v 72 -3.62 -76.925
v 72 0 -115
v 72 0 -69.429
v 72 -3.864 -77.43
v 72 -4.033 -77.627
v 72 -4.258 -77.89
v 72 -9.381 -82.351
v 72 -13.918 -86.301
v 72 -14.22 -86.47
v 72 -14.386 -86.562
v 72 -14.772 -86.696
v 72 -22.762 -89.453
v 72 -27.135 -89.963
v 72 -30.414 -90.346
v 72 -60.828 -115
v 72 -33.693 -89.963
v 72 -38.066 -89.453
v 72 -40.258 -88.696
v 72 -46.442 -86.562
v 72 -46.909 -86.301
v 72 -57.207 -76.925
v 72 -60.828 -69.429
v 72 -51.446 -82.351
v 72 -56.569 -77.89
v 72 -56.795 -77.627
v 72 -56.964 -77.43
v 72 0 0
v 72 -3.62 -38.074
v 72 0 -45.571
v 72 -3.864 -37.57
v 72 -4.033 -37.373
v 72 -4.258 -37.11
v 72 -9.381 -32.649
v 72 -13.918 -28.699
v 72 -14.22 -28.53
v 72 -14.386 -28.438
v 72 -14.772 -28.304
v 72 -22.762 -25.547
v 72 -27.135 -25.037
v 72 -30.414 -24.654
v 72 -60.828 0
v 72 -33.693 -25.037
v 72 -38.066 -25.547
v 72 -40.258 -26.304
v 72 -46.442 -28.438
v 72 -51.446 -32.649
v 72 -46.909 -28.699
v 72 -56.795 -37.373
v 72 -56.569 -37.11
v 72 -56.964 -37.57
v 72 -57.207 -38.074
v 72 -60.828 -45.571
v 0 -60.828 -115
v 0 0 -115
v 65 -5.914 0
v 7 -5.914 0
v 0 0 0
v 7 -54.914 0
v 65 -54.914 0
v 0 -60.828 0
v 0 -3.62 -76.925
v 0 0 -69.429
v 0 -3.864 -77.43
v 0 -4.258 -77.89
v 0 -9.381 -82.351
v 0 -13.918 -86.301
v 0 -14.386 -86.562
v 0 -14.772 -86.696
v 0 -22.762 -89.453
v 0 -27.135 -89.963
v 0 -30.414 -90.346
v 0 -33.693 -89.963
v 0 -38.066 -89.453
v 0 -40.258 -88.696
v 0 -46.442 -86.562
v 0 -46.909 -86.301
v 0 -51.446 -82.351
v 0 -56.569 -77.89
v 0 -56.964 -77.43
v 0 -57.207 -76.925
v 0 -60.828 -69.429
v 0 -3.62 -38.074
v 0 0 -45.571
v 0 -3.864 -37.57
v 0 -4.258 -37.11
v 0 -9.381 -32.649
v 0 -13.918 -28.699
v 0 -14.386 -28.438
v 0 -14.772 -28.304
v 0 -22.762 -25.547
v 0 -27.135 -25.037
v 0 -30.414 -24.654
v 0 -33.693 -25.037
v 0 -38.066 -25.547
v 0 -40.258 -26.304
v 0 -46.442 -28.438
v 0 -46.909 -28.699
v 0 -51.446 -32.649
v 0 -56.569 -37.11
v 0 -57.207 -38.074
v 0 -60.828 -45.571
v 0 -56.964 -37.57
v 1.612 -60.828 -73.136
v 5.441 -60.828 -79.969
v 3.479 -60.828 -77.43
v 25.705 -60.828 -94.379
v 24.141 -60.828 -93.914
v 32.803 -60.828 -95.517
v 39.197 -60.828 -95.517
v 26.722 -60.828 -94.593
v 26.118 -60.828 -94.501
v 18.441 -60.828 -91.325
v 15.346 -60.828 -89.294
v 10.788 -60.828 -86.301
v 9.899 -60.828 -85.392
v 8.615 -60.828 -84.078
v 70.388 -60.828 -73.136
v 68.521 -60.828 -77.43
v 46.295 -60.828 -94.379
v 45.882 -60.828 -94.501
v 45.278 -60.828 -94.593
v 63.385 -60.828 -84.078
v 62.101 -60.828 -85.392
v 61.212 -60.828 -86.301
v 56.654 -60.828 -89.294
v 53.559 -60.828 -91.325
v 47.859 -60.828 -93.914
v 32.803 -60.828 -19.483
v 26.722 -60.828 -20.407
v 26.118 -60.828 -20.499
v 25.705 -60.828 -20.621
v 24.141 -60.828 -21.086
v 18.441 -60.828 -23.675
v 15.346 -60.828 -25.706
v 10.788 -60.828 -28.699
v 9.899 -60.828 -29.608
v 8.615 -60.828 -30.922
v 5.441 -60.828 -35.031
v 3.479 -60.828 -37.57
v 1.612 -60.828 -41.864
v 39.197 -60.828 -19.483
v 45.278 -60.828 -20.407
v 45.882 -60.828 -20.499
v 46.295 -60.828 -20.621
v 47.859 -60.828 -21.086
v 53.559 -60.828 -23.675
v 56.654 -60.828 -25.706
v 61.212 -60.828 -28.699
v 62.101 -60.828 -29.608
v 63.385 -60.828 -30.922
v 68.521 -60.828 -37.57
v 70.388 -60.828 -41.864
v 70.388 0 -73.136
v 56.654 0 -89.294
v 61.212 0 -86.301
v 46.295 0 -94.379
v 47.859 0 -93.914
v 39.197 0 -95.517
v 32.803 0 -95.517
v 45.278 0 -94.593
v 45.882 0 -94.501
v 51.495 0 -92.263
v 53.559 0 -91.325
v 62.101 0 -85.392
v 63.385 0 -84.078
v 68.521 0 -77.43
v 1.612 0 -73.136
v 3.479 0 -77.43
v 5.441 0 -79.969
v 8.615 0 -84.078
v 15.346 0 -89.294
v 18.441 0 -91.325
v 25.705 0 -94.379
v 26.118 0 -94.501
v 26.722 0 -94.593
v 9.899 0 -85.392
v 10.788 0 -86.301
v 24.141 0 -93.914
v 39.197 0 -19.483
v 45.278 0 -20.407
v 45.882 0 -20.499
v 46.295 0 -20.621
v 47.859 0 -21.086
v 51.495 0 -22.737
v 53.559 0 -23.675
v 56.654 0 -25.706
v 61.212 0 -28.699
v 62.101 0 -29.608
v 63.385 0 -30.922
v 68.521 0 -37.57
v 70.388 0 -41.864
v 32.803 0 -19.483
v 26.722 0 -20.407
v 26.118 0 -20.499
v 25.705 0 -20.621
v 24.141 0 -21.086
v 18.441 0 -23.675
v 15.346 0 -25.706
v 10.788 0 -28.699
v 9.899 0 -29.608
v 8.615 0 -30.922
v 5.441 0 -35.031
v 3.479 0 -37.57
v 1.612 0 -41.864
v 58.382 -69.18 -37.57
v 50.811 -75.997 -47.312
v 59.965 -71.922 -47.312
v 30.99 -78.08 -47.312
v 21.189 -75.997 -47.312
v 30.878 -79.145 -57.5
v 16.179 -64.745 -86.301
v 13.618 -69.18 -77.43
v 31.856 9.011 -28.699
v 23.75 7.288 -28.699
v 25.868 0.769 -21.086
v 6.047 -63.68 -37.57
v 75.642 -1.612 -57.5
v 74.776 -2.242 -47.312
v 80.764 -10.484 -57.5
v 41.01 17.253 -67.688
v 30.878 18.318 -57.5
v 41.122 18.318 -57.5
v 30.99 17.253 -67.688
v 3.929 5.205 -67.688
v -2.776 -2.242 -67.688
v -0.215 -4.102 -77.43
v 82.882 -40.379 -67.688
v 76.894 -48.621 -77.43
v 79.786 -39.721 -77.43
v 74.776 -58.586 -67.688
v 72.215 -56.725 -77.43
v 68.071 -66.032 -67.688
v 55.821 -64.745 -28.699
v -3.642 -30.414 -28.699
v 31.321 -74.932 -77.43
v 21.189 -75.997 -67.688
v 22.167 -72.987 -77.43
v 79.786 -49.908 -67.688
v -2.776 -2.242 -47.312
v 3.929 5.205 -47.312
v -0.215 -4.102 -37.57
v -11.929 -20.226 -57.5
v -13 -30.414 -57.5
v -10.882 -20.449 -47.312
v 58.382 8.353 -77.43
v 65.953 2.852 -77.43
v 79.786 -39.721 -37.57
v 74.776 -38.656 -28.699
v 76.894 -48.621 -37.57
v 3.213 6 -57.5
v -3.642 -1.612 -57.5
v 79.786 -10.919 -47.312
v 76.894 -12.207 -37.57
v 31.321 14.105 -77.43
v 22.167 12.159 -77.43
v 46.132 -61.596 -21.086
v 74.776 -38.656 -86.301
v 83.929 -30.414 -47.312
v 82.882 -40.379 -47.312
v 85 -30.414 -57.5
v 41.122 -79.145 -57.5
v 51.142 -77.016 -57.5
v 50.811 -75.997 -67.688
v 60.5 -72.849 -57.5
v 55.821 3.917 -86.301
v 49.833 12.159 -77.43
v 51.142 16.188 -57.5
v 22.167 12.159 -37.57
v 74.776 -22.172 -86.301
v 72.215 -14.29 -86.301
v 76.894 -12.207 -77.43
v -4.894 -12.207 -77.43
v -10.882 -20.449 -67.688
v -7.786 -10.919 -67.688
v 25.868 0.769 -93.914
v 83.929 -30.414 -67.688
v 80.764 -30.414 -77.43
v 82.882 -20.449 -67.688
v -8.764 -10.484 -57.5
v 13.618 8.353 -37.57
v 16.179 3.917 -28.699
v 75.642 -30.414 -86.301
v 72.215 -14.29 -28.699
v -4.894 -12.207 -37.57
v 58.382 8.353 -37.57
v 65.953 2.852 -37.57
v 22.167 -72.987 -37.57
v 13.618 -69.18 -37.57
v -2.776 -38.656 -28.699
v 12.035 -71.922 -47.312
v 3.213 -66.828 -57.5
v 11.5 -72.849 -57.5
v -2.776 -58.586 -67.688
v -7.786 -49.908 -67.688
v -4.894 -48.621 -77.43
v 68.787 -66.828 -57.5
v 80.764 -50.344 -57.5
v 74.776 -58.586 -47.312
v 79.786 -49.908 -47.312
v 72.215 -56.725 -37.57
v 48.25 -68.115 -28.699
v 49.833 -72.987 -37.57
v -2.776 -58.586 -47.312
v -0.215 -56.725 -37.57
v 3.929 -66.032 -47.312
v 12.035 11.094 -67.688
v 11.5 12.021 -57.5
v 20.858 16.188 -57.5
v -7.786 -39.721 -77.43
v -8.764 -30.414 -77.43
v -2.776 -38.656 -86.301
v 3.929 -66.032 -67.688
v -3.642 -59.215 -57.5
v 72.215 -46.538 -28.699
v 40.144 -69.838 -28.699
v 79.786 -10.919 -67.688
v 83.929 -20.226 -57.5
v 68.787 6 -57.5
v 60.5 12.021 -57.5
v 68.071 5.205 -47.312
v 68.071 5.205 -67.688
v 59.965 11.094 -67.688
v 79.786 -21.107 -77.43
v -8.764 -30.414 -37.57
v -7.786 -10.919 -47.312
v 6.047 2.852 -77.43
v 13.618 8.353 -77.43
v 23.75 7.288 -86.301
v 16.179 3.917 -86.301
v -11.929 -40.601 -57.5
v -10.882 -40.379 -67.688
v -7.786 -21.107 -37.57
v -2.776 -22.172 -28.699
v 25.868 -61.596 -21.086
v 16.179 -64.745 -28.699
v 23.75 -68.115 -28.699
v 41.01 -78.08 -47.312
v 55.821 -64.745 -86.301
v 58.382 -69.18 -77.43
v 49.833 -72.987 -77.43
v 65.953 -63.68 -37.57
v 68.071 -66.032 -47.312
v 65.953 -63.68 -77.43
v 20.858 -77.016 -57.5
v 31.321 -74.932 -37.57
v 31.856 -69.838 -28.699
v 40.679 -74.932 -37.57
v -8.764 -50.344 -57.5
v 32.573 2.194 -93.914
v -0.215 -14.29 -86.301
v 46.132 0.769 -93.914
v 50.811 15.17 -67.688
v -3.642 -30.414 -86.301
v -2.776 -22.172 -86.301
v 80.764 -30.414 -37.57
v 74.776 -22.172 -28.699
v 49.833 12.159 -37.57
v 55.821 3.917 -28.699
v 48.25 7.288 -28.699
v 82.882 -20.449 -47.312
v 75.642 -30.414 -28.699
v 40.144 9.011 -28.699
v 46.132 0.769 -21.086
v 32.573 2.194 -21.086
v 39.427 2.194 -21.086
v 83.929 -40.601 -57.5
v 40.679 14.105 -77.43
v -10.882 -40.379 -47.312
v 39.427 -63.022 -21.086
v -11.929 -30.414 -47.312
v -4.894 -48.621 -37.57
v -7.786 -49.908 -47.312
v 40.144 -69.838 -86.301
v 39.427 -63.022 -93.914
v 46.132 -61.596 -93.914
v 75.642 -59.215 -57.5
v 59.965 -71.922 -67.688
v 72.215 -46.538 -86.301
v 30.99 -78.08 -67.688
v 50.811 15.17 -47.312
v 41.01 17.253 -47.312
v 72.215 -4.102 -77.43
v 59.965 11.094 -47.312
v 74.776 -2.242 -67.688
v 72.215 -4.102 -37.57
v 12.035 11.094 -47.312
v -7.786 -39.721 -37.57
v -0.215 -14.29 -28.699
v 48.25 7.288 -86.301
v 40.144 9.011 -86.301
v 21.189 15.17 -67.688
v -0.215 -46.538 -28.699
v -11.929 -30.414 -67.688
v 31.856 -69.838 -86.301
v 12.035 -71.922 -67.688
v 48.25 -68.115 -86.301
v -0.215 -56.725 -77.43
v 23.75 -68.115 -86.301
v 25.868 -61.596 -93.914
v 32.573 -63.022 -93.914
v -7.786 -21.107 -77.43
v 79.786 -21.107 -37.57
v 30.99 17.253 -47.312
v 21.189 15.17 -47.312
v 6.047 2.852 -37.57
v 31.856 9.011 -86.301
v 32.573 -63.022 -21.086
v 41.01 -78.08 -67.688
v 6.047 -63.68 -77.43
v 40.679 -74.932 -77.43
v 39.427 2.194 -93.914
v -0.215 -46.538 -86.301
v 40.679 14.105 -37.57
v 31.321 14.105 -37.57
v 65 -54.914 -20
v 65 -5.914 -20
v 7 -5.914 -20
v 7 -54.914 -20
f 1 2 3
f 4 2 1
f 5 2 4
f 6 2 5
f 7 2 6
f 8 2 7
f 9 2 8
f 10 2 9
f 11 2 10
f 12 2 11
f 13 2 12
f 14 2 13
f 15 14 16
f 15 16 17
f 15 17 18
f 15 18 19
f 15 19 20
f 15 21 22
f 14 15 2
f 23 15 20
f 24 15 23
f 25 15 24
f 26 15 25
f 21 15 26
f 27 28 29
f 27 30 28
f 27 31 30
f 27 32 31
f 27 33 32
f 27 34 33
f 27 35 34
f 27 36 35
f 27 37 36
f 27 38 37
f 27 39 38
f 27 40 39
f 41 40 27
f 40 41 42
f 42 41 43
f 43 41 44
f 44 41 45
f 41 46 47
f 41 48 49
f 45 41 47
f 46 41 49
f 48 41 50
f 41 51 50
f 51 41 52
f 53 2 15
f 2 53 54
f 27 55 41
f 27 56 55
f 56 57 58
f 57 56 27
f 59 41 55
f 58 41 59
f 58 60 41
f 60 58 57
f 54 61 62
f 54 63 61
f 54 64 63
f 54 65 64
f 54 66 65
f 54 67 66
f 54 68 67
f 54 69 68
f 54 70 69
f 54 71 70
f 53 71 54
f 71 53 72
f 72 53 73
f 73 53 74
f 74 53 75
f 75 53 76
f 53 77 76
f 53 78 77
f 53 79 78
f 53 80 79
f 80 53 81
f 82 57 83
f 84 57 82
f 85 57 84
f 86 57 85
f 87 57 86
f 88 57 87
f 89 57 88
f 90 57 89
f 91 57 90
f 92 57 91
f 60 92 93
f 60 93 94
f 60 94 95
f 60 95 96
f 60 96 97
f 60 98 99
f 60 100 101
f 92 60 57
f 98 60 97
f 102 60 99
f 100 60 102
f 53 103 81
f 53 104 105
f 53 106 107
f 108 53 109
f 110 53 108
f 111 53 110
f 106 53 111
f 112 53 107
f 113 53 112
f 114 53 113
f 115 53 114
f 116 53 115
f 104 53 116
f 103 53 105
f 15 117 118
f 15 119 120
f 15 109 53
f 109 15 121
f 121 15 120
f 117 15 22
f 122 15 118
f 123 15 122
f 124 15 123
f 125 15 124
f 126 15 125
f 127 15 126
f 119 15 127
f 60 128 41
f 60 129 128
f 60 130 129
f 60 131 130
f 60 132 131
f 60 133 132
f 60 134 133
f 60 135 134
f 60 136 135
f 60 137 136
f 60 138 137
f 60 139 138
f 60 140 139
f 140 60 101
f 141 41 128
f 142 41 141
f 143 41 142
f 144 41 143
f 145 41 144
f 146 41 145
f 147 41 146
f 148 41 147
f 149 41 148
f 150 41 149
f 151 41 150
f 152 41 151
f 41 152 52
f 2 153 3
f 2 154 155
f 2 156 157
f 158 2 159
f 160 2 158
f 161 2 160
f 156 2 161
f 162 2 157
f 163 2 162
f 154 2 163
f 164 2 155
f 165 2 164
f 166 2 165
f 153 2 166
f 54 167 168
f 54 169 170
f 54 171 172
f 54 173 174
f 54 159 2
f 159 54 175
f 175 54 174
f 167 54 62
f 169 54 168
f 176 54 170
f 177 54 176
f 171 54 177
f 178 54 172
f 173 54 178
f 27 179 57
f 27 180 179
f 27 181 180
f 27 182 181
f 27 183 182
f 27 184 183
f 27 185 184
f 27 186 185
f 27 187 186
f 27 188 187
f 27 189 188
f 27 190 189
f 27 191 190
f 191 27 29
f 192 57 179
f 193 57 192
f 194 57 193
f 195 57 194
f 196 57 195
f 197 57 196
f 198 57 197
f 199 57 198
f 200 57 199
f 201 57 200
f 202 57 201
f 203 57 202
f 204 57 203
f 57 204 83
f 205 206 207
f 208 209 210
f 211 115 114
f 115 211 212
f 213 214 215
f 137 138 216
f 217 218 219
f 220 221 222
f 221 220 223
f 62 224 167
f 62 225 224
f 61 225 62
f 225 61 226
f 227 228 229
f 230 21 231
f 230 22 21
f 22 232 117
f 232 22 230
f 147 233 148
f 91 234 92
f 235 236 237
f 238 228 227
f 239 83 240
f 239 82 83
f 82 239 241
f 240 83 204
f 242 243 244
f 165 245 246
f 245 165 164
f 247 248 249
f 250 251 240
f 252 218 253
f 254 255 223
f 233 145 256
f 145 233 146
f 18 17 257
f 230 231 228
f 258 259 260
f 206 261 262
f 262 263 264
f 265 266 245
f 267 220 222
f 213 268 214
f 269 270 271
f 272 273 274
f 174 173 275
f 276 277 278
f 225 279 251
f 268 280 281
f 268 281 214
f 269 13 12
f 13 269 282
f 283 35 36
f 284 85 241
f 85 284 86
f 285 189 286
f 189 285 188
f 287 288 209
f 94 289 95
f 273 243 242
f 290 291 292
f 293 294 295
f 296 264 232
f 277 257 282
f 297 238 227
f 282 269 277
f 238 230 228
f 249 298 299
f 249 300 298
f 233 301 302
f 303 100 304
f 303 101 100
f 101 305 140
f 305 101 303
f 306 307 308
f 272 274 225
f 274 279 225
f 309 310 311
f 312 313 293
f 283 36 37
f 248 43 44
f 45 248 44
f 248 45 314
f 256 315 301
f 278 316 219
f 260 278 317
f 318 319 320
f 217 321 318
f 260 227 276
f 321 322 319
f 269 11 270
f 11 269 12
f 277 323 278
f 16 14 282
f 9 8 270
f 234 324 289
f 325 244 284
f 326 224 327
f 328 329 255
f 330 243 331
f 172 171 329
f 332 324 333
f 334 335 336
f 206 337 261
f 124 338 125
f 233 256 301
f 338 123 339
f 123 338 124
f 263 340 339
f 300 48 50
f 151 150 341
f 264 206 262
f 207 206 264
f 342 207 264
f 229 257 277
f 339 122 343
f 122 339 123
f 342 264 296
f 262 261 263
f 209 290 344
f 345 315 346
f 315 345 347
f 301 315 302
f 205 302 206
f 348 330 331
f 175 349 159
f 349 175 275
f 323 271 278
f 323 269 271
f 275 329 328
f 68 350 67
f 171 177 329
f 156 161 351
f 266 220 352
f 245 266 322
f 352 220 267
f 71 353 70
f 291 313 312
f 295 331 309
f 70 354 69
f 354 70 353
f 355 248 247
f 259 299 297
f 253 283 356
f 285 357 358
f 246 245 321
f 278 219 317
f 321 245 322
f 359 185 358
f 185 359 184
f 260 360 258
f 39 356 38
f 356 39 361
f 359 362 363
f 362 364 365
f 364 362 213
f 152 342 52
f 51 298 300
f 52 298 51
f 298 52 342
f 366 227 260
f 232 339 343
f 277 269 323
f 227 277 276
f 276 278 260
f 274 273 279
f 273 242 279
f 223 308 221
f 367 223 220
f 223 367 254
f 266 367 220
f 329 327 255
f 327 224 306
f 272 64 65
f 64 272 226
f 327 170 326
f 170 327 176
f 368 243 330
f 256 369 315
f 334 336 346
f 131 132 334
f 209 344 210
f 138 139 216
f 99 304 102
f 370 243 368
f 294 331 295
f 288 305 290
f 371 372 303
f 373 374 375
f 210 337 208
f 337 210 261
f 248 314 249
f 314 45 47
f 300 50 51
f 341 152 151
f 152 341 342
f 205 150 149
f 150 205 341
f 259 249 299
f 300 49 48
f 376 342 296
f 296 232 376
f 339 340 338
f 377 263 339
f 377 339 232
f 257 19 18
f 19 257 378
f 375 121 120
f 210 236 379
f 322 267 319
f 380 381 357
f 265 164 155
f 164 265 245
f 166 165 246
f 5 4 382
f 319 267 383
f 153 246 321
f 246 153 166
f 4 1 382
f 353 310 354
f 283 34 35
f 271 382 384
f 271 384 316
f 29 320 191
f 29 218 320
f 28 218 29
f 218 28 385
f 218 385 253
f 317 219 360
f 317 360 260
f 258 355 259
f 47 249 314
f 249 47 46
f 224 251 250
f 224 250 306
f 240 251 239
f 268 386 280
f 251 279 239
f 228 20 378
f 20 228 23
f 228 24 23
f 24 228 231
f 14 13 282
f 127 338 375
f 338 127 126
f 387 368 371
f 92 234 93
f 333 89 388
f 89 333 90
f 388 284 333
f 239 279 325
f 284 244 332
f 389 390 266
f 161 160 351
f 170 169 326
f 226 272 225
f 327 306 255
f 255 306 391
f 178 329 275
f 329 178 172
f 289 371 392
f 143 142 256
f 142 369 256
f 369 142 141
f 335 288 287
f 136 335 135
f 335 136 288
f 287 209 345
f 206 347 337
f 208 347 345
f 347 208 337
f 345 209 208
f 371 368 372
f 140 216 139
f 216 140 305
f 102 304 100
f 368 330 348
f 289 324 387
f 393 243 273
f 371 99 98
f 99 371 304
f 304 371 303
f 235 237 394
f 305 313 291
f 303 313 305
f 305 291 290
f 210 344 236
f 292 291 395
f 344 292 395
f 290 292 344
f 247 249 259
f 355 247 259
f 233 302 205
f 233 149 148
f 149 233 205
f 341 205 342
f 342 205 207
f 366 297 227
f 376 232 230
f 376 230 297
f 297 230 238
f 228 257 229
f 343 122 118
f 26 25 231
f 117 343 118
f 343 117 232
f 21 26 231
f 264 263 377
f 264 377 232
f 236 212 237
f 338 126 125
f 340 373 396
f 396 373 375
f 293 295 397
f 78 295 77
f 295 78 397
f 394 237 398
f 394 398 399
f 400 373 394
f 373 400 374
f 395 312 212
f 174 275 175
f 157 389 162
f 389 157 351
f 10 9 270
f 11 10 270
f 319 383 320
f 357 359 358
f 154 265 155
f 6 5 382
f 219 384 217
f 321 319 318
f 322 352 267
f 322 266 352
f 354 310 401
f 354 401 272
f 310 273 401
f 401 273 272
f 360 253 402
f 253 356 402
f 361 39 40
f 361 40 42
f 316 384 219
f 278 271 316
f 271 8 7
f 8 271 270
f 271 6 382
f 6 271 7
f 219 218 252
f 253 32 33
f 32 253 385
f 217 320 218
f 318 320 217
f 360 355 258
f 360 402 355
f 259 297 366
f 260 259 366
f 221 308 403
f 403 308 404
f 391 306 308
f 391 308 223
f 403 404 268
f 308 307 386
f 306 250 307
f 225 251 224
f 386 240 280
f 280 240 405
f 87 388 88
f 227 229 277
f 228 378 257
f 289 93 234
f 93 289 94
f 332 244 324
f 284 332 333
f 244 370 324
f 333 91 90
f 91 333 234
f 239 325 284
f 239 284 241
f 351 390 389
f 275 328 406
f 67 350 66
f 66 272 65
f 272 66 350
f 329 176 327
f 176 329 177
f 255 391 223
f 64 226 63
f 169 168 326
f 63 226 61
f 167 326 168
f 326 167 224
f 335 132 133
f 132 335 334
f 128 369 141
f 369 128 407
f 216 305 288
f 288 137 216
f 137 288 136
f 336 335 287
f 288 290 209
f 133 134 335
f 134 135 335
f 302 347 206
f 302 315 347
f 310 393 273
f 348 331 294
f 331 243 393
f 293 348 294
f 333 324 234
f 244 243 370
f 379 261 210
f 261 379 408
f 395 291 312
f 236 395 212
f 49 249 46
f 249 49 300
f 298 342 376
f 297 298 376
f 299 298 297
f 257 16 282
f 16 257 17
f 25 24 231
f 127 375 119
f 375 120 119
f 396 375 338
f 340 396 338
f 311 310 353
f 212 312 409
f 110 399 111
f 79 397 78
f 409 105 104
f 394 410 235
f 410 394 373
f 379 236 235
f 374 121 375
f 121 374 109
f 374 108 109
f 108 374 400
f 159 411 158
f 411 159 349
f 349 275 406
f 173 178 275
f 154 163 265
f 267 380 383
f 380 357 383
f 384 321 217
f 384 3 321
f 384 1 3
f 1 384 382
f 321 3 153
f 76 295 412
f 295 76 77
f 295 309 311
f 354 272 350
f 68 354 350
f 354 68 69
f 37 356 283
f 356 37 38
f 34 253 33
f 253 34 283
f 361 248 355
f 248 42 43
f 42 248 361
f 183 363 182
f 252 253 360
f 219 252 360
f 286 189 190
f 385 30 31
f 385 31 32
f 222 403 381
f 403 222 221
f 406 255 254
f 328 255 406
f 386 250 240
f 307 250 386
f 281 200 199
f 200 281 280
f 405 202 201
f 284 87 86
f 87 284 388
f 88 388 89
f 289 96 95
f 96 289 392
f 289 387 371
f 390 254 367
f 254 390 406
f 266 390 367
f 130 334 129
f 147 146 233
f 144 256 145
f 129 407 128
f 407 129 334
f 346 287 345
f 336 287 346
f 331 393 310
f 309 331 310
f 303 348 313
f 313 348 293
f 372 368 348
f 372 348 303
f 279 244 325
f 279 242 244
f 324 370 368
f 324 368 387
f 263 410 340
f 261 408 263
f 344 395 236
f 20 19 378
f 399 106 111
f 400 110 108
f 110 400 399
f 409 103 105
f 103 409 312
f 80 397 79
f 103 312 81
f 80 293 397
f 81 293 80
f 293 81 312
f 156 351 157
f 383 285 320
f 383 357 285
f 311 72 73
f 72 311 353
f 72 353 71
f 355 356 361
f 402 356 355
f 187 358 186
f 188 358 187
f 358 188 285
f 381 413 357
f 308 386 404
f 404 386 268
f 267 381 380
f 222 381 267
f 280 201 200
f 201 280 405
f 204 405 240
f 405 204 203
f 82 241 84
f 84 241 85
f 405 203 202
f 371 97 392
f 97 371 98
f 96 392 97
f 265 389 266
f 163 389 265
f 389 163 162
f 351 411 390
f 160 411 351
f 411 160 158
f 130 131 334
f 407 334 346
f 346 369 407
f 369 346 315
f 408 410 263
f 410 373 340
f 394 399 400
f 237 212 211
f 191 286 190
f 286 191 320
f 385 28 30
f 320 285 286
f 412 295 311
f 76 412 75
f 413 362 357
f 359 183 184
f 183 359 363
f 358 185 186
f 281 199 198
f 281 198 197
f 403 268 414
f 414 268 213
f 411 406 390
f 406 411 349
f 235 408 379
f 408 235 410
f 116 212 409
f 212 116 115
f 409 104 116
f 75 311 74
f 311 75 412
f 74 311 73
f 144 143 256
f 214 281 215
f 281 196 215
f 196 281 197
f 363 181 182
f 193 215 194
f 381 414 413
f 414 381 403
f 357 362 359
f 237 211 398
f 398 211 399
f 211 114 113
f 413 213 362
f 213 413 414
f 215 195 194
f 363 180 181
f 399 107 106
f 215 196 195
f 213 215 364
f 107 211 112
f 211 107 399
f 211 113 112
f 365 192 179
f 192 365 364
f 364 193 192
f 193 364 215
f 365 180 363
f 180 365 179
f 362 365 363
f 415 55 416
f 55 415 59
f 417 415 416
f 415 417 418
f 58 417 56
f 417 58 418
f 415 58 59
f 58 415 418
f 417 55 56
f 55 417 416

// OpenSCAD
devL = 58;
devW = 49;
devH = 20;
mntL = 72;
mntW = (mntL / devL) * devW; //55;
mntH = 115;

zeroL = 0.25;
oneL = 0.50;
twoL = 0.75;

oneRate = 0.3;
twoRate = 0.1;

rotate ([180,0,0]) difference () {
    union () { 
         color("blue") { cube([mntL, mntW, mntH]); }
         translate ([0.5 * mntL, 0.5 * mntW, 0.5 * mntH]) { sphere(r=devW) ; }
    }
    translate ([0.5 * (mntL - devL),
                0.5 * (mntW - devW),
			   0]) {  cube([devL, devW, devH]) ;}
}
